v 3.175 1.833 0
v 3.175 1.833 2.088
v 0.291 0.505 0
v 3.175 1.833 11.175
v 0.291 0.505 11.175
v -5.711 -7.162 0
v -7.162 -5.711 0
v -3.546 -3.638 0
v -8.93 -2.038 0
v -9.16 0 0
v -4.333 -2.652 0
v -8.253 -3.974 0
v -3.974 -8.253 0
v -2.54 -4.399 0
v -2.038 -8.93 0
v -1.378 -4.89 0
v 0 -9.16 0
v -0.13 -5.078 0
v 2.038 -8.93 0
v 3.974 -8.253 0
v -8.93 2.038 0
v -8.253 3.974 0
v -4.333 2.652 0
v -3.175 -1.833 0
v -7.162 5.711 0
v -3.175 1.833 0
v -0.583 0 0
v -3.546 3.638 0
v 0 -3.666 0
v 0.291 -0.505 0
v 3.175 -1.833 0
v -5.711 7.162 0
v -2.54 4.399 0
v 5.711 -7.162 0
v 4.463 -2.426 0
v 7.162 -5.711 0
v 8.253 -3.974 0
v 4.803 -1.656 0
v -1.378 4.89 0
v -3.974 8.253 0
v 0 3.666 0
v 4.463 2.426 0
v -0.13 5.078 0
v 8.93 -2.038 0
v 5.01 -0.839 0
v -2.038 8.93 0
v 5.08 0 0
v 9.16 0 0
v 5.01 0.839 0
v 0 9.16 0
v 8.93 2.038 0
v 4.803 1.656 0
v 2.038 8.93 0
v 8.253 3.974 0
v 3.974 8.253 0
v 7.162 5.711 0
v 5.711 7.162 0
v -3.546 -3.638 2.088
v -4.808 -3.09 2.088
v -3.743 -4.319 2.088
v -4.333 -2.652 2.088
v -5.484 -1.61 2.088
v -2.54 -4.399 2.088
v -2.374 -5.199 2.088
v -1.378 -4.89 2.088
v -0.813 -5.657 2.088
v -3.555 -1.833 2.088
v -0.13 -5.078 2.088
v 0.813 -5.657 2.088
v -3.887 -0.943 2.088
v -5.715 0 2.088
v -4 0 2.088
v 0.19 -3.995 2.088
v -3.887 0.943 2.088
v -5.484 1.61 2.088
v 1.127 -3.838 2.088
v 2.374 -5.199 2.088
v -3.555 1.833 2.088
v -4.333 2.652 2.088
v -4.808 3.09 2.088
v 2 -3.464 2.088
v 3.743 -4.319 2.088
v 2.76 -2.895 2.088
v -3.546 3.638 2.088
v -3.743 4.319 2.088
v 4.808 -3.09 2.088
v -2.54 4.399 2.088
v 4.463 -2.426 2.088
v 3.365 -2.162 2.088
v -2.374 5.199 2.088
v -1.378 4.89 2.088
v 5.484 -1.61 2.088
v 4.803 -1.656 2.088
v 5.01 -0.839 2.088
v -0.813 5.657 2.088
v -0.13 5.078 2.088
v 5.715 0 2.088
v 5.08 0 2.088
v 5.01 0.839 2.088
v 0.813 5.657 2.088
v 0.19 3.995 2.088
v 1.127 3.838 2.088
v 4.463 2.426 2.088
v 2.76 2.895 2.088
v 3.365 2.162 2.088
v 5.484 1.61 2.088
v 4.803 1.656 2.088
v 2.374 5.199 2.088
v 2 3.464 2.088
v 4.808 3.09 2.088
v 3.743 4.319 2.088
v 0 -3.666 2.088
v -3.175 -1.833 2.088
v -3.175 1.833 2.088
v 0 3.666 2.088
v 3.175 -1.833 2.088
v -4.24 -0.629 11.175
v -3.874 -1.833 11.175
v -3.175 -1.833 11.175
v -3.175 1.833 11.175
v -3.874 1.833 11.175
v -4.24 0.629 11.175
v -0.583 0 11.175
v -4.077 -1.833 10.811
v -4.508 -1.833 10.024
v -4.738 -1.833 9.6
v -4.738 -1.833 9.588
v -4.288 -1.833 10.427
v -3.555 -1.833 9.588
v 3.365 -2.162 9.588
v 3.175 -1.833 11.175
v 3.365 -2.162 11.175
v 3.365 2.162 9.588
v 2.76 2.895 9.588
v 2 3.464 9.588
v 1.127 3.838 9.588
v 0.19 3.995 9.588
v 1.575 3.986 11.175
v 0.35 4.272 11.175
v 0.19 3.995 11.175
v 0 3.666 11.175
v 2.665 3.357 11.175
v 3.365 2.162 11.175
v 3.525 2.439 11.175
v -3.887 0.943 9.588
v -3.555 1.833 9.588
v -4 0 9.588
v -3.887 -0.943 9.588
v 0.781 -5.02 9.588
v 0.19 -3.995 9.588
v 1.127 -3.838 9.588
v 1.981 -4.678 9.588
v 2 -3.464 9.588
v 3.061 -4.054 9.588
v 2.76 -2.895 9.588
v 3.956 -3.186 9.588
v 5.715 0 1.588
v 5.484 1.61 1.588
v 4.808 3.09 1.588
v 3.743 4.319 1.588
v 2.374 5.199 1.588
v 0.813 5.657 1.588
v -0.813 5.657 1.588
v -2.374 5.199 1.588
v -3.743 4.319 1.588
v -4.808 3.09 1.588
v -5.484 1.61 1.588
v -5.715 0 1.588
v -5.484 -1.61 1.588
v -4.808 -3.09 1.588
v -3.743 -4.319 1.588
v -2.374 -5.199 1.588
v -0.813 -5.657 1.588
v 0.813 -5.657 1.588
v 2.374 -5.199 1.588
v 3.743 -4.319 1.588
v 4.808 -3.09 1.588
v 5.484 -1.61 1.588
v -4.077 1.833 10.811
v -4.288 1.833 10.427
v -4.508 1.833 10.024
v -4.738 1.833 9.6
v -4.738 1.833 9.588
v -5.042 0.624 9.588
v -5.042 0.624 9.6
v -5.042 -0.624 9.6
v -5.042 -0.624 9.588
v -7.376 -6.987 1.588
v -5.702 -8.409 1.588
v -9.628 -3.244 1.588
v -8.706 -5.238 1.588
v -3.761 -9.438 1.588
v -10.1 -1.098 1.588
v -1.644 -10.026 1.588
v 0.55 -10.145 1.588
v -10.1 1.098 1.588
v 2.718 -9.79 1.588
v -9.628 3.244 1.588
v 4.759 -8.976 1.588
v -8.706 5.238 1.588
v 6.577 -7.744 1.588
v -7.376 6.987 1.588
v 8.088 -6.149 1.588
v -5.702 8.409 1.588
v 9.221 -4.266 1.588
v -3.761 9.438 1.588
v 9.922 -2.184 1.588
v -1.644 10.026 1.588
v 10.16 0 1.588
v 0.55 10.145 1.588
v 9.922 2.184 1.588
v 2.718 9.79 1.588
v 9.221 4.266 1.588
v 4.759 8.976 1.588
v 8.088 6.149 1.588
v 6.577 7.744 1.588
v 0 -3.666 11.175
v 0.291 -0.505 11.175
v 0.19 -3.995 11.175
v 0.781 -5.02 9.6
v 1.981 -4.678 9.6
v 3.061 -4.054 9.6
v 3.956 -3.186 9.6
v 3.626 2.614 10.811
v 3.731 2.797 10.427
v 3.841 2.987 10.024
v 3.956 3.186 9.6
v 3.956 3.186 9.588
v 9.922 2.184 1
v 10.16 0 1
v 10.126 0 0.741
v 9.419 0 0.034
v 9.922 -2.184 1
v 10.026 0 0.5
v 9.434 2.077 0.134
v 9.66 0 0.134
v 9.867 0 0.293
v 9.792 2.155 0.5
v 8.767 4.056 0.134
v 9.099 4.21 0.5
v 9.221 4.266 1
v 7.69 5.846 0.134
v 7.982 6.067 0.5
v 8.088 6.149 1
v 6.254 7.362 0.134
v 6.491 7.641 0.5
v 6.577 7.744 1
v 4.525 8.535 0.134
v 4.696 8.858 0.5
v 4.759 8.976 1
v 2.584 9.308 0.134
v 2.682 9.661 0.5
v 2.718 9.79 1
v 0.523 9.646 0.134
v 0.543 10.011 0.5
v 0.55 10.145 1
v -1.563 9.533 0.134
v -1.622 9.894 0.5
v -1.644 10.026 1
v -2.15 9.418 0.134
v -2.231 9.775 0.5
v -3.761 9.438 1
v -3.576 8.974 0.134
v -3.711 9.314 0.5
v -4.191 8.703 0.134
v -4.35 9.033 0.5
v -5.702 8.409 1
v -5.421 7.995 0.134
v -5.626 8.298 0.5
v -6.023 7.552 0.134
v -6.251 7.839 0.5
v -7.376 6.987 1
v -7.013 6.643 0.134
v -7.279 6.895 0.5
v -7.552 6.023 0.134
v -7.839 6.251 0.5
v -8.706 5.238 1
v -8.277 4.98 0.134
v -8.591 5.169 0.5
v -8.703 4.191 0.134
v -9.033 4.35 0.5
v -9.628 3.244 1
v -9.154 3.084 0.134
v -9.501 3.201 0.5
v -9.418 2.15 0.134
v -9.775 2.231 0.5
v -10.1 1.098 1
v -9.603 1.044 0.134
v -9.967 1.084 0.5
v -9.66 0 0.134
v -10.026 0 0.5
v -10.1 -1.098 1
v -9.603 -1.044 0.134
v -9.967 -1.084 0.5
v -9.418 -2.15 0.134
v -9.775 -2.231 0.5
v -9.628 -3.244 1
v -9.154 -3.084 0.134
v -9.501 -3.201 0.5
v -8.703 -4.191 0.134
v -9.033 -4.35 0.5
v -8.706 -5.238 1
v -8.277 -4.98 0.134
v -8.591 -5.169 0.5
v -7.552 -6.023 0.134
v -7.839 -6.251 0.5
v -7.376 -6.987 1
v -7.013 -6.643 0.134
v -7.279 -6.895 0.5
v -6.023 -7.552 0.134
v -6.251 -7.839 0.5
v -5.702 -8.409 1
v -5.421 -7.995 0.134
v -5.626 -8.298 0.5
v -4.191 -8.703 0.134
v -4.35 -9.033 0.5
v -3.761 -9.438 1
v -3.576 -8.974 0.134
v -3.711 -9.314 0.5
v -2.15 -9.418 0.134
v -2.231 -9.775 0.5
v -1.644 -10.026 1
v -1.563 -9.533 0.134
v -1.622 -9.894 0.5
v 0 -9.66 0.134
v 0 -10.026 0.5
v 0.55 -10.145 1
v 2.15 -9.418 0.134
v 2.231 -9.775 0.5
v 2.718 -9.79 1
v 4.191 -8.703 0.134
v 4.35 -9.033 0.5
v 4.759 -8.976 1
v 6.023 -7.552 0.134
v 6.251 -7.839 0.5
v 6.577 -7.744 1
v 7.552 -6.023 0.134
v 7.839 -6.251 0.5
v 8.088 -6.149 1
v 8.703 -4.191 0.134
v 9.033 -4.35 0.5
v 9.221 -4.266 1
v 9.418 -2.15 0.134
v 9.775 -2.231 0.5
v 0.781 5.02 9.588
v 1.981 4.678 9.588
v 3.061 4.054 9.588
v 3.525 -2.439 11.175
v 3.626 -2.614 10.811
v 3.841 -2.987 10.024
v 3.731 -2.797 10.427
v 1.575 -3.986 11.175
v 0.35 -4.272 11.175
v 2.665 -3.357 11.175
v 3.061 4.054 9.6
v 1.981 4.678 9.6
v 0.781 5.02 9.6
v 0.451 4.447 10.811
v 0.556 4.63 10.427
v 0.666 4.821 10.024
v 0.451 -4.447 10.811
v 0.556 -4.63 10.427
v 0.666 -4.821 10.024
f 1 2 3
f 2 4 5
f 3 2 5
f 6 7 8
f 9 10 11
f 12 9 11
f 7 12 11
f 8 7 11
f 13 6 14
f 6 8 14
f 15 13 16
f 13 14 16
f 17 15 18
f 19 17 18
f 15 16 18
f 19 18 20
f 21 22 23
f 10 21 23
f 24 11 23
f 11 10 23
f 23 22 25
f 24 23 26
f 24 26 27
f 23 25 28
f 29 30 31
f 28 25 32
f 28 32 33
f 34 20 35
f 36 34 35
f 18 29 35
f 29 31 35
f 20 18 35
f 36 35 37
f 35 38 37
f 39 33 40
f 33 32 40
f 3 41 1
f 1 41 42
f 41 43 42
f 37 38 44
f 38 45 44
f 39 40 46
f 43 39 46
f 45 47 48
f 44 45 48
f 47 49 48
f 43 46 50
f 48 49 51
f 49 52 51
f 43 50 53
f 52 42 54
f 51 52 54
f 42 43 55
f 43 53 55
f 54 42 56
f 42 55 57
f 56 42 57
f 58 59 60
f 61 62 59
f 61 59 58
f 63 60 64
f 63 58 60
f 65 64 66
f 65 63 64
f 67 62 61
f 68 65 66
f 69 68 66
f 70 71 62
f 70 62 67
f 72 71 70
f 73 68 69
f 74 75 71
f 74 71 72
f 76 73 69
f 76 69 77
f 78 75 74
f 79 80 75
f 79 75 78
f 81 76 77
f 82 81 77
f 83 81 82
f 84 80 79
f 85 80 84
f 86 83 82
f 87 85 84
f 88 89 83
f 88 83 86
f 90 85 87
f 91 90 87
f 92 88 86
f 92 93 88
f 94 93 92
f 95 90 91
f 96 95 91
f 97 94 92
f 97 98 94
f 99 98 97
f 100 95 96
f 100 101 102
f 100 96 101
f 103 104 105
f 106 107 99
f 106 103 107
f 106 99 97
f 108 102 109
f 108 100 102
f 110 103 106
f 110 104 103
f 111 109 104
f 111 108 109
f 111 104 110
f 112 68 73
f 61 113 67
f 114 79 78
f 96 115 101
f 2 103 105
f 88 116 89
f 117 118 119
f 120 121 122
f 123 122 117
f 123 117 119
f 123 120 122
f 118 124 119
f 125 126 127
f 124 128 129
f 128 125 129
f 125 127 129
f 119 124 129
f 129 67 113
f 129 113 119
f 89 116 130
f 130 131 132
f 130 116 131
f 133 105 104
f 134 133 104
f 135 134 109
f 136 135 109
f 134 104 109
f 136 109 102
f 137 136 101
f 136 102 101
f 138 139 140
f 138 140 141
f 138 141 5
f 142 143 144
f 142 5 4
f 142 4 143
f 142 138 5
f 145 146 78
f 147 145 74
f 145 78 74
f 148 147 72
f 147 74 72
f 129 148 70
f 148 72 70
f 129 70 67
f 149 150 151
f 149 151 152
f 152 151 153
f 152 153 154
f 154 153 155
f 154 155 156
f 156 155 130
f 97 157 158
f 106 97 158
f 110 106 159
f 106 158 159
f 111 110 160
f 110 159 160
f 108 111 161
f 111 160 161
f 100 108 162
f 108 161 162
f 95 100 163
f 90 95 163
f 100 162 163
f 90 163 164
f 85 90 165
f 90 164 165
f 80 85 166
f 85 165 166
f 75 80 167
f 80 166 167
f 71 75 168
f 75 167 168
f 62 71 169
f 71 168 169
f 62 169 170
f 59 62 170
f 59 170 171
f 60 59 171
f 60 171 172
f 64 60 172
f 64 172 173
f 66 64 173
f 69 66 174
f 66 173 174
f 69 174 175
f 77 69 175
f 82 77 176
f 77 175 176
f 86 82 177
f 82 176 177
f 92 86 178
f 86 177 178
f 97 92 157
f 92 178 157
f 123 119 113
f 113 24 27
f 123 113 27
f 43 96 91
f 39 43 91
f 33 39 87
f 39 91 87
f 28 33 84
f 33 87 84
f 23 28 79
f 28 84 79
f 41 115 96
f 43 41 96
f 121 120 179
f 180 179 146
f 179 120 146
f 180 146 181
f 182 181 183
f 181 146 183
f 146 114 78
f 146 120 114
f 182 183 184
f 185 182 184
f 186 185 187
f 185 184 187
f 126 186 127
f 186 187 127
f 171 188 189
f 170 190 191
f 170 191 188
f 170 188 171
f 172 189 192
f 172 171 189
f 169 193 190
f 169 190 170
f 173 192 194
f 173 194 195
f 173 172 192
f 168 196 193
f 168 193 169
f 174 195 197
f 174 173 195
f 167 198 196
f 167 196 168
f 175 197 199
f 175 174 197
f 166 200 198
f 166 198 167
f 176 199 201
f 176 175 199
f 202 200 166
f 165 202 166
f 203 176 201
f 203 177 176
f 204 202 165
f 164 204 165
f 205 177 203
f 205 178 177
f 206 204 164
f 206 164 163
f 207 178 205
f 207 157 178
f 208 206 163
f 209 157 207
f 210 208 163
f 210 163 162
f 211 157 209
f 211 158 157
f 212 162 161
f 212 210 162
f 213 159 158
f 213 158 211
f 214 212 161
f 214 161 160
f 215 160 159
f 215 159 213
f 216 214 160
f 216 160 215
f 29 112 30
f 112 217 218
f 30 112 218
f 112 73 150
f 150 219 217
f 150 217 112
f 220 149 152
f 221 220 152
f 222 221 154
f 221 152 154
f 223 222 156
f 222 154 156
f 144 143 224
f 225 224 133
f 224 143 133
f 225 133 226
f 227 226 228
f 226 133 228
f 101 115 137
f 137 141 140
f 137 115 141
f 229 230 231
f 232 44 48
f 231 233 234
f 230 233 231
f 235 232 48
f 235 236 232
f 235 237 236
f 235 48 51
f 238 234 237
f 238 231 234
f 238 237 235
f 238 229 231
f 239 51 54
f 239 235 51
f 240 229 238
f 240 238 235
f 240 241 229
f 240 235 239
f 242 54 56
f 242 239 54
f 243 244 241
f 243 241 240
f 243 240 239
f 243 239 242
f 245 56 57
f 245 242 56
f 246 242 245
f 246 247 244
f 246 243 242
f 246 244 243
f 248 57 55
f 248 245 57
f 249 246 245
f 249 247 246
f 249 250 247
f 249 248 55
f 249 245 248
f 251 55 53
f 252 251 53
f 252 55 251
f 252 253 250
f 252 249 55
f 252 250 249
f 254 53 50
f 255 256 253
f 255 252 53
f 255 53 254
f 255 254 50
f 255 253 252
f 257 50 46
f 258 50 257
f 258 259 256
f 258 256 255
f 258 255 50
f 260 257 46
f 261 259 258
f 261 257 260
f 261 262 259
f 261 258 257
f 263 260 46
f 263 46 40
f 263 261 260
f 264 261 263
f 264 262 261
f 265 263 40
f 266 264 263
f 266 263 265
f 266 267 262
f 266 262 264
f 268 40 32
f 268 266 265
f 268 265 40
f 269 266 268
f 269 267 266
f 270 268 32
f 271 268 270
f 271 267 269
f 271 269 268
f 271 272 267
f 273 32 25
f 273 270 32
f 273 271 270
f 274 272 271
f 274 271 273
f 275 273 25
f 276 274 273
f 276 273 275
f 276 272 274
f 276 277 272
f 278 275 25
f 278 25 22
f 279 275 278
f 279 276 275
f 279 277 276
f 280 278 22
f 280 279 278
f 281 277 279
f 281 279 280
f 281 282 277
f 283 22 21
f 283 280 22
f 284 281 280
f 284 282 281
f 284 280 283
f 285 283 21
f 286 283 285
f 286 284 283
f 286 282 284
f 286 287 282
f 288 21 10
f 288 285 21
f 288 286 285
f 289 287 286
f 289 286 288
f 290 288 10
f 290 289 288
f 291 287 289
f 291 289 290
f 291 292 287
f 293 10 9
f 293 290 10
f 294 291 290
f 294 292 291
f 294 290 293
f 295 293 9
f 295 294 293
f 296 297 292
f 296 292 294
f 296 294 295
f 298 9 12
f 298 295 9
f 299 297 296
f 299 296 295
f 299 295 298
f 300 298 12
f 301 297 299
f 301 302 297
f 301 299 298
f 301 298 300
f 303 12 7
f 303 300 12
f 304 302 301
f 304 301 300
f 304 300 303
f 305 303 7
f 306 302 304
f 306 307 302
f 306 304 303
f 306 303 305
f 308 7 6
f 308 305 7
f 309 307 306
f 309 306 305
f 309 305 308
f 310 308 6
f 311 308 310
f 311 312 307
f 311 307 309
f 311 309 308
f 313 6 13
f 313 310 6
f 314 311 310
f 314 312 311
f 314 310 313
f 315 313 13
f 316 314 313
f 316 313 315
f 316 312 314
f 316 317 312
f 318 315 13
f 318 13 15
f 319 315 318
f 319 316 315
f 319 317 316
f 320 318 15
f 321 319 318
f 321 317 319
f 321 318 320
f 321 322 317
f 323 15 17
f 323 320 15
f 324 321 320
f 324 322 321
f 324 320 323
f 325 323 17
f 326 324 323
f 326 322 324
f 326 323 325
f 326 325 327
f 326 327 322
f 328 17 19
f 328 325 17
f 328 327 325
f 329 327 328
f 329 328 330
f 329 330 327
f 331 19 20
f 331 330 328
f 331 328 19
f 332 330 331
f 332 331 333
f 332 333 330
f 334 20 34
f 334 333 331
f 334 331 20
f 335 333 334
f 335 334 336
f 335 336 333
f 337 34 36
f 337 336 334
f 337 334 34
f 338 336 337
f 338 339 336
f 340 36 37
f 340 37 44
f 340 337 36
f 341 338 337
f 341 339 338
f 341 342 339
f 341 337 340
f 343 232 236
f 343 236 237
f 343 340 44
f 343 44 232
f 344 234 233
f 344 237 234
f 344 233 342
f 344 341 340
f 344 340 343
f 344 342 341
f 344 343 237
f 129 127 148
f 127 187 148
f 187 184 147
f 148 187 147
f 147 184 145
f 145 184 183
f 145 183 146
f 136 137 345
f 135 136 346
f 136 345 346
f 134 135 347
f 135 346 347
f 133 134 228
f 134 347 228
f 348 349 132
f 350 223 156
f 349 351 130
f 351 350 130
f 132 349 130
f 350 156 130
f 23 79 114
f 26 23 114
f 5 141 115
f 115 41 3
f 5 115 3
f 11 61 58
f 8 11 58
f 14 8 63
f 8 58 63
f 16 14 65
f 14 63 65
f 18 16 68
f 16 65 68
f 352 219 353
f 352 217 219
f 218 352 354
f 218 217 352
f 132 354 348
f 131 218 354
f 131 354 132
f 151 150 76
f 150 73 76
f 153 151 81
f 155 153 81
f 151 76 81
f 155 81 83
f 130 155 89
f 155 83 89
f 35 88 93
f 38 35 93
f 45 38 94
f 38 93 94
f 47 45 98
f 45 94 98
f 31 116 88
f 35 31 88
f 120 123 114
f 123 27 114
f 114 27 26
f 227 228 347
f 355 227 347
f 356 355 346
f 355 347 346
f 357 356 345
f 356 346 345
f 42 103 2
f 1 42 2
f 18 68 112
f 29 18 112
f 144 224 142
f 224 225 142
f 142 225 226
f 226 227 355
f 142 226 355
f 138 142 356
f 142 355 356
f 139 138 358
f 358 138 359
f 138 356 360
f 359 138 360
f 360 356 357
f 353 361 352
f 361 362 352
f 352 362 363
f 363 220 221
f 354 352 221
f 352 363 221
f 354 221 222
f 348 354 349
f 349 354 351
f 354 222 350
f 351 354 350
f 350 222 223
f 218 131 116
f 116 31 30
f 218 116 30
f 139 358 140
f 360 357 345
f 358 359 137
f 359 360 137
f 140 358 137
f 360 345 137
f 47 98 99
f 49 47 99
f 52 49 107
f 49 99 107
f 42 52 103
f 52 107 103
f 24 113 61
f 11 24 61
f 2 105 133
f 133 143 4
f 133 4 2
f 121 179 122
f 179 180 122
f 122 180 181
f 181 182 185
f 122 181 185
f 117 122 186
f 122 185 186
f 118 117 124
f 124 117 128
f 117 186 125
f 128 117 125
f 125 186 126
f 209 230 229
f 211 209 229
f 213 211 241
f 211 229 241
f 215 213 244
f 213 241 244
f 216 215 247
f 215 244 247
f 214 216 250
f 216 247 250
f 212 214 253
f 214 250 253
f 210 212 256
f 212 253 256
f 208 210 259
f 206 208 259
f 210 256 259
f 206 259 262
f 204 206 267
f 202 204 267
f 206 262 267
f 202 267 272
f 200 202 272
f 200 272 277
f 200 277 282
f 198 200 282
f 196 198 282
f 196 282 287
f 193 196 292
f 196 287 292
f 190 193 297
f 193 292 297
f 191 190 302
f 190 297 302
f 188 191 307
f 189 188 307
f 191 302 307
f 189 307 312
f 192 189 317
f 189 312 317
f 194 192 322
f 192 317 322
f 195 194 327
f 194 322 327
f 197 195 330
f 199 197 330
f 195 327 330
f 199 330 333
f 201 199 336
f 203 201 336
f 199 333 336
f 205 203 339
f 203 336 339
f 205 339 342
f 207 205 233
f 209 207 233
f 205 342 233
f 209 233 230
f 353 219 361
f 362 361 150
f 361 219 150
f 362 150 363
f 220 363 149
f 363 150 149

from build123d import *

# Parameters (mm, degrees)
F0_R        = 10.16
F1_DEPTH    = 1.5875
F2_R        = 4
F3_DEPTH    = 8
F5_DEPTH    = 8
F6_R        = 5.715
F7_DEPTH    = 0.5
F9_DEPTH    = 1.5875
F10_SIZE2   = 1.5748
F10_SIZE    = 0.79375
F10_2_SIZE2 = 1.5748
F10_2_SIZE  = 0.79375
F10_3_SIZE2 = 1.5748
F10_3_SIZE  = 0.79375
F12_DEPTH   = 2.0885
F13_R       = 1


with BuildPart() as f1:
    # F0 (on Top) → F1 (new body)
    with BuildSketch(Plane.XY):
        Circle(F0_R)
    extrude(amount=F1_DEPTH)

    # F2 (on face) → F3 (join)
    with BuildSketch(Plane.XY.offset(1.5875)):
        Circle(F2_R)
        Polygon((0, 3.6661742094), (3.175, 1.8330871047), (3.175, -1.8330871047), (0, -3.6661742094), (-3.175, -1.8330871047), (-3.175, 1.8330871047), align=None, mode=Mode.SUBTRACT)
        Polygon((-0.5826233556, 0), (-3.175, 1.8330871047), (-3.175, -1.8330871047), align=None)
        Polygon((0.2913116778, 0.5045666267), (3.175, 1.8330871047), (0, 3.6661742094), align=None)
        Polygon((0, -3.6661742094), (3.175, -1.8330871047), (0.2913116778, -0.5045666267), align=None)
    extrude(amount=F3_DEPTH)

    # F4 (on face) → F5 (cut, through all)
    with BuildSketch(Plane.XY.offset(9.5875)):
        with BuildLine():
            Line((-3.175, 1.8330871047), (0, 3.6661742094))
            Line((0, 3.6661742094), (0.1901242338, 3.9954790421))
            ThreePointArc((0.1901242338, 3.9954790421), (-2, 3.4641016151), (-3.5552484676, 1.8330871047))
            Line((-3.5552484676, 1.8330871047), (-3.175, 1.8330871047))
        make_face()
        with BuildLine():
            Line((3.3651242338, 2.1623919374), (3.175, 1.8330871047))
            Line((3.175, 1.8330871047), (3.175, -1.8330871047))
            Line((3.175, -1.8330871047), (3.3651242338, -2.1623919374))
            ThreePointArc((3.3651242338, -2.1623919374), (3.838000582, -1.1268325219), (4, 0))
            ThreePointArc((4, 0), (3.838000582, 1.1268325219), (3.3651242338, 2.1623919374))
        make_face()
        with BuildLine():
            Line((0, -3.6661742094), (-3.175, -1.8330871047))
            Line((-3.175, -1.8330871047), (-3.5552484676, -1.8330871047))
            ThreePointArc((-3.5552484676, -1.8330871047), (-2, -3.4641016151), (0.1901242338, -3.9954790421))
            Line((0.1901242338, -3.9954790421), (0, -3.6661742094))
        make_face()
    extrude(amount=-F5_DEPTH, mode=Mode.SUBTRACT)

    # F6 (on face) → F7 (join)
    with BuildSketch(Plane.XY.offset(1.5875)):
        Circle(F6_R)
    extrude(amount=F7_DEPTH)

    # F8 (on face) → F9 (join)
    with BuildSketch(Plane.XY.offset(9.5875)):
        Polygon((-3.175, -1.8330871047), (-0.5826233556, 0), (-3.175, 1.8330871047), (-3.5552484676, 1.8330871047), (-3.5552484676, -1.8330871047), align=None)
        with BuildLine():
            ThreePointArc((-3.5552484676, 1.8330871047), (-4, 0), (-3.5552484676, -1.8330871047))
            Line((-3.5552484676, -1.8330871047), (-3.5552484676, 1.8330871047))
        make_face()
        with BuildLine():
            Line((-4.7377411988, -1.8330871047), (-3.5552484676, -1.8330871047))
            ThreePointArc((-3.5552484676, -1.8330871047), (-4, 0), (-3.5552484676, 1.8330871047))
            Line((-3.5552484676, 1.8330871047), (-4.7377411988, 1.8330871047))
            ThreePointArc((-4.7377411988, 1.8330871047), (-5.08, 0), (-4.7377411988, -1.8330871047))
        make_face()
        Polygon((0.1901242338, 3.9954790421), (0, 3.6661742094), (0.2913116778, 0.5045666267), (3.175, 1.8330871047), (3.3651242338, 2.1623919374), align=None)
        with BuildLine():
            ThreePointArc((3.3651242338, 2.1623919374), (2, 3.4641016151), (0.1901242338, 3.9954790421))
            Line((0.1901242338, 3.9954790421), (3.3651242338, 2.1623919374))
        make_face()
        with BuildLine():
            Line((0.7813705994, 5.019547787), (0.1901242338, 3.9954790421))
            ThreePointArc((0.1901242338, 3.9954790421), (2, 3.4641016151), (3.3651242338, 2.1623919374))
            Line((3.3651242338, 2.1623919374), (3.9563705994, 3.1864606824))
            ThreePointArc((3.9563705994, 3.1864606824), (2.54, 4.3994090512), (0.7813705994, 5.019547787))
        make_face()
        Polygon((3.175, -1.8330871047), (0.2913116778, -0.5045666267), (0, -3.6661742094), (0.1901242338, -3.9954790421), (3.3651242338, -2.1623919374), align=None)
        with BuildLine():
            ThreePointArc((0.1901242338, -3.9954790421), (2, -3.4641016151), (3.3651242338, -2.1623919374))
            Line((3.3651242338, -2.1623919374), (0.1901242338, -3.9954790421))
        make_face()
        with BuildLine():
            Line((3.9563705994, -3.1864606824), (3.3651242338, -2.1623919374))
            ThreePointArc((3.3651242338, -2.1623919374), (2, -3.4641016151), (0.1901242338, -3.9954790421))
            Line((0.1901242338, -3.9954790421), (0.7813705994, -5.019547787))
            ThreePointArc((0.7813705994, -5.019547787), (2.54, -4.3994090512), (3.9563705994, -3.1864606824))
        make_face()
    extrude(amount=F9_DEPTH)

    # F10
    f10_edges = [f1.edges().sort_by_distance(p)[0] for p in [
        (2.54, -4.399409, 11.175),
    ]]
    f10_side = f1.faces().sort_by_distance((1.667082, -2.88747, 11.175))[0]
    chamfer(f10_edges, length=F10_SIZE, length2=F10_SIZE2, reference=f10_side)

    # F10#2
    f10_2_edges = [f1.edges().sort_by_distance(p)[0] for p in [
        (2.54, 4.399409, 11.175),
    ]]
    f10_2_side = f1.faces().sort_by_distance((1.667082, 2.88747, 11.175))[0]
    chamfer(f10_2_edges, length=F10_2_SIZE, length2=F10_2_SIZE2, reference=f10_2_side)

    # F10#3
    f10_3_edges = [f1.edges().sort_by_distance(p)[0] for p in [
        (-5.08, 0, 11.175),
    ]]
    f10_3_side = f1.faces().sort_by_distance((-3.334164, 0, 11.175))[0]
    chamfer(f10_3_edges, length=F10_3_SIZE, length2=F10_3_SIZE2, reference=f10_3_side)

    # F11 (on face) → F12 (cut, through all)
    with BuildSketch(Plane.XY.offset(2.0875)):
        with BuildLine():
            ThreePointArc((4.4630241186, -2.4264821691), (4.9233404576, -1.2518461322), (5.08, 0))
            ThreePointArc((5.08, 0), (4.9233404576, 1.2518461322), (4.4630241186, 2.4264821691))
            Line((4.4630241186, 2.4264821691), (3.175, 1.8330871047))
            Line((3.175, 1.8330871047), (0.2913116778, 0.5045666267))
            Line((0.2913116778, 0.5045666267), (0, 3.6661742094))
            Line((0, 3.6661742094), (-0.1301168591, 5.0783333489))
            ThreePointArc((-0.1301168591, 5.0783333489), (-2.54, 4.3994090512), (-4.3329072595, 2.6518511799))
            Line((-4.3329072595, 2.6518511799), (-3.175, 1.8330871047))
            Line((-3.175, 1.8330871047), (-0.5826233556, 0))
            Line((-0.5826233556, 0), (-3.175, -1.8330871047))
            Line((-3.175, -1.8330871047), (-4.3329072595, -2.6518511799))
            ThreePointArc((-4.3329072595, -2.6518511799), (-2.54, -4.3994090512), (-0.1301168591, -5.0783333489))
            Line((-0.1301168591, -5.0783333489), (0, -3.6661742094))
            Line((0, -3.6661742094), (0.2913116778, -0.5045666267))
            Line((0.2913116778, -0.5045666267), (3.175, -1.8330871047))
            Line((3.175, -1.8330871047), (4.4630241186, -2.4264821691))
        make_face()
    extrude(amount=-F12_DEPTH, mode=Mode.SUBTRACT)

    # F13
    f13_edges = [f1.edges().sort_by_distance(p)[0] for p in [
        (-10.16, 0, 0),
    ]]
    fillet(f13_edges, radius=F13_R)


solid = f1.part
